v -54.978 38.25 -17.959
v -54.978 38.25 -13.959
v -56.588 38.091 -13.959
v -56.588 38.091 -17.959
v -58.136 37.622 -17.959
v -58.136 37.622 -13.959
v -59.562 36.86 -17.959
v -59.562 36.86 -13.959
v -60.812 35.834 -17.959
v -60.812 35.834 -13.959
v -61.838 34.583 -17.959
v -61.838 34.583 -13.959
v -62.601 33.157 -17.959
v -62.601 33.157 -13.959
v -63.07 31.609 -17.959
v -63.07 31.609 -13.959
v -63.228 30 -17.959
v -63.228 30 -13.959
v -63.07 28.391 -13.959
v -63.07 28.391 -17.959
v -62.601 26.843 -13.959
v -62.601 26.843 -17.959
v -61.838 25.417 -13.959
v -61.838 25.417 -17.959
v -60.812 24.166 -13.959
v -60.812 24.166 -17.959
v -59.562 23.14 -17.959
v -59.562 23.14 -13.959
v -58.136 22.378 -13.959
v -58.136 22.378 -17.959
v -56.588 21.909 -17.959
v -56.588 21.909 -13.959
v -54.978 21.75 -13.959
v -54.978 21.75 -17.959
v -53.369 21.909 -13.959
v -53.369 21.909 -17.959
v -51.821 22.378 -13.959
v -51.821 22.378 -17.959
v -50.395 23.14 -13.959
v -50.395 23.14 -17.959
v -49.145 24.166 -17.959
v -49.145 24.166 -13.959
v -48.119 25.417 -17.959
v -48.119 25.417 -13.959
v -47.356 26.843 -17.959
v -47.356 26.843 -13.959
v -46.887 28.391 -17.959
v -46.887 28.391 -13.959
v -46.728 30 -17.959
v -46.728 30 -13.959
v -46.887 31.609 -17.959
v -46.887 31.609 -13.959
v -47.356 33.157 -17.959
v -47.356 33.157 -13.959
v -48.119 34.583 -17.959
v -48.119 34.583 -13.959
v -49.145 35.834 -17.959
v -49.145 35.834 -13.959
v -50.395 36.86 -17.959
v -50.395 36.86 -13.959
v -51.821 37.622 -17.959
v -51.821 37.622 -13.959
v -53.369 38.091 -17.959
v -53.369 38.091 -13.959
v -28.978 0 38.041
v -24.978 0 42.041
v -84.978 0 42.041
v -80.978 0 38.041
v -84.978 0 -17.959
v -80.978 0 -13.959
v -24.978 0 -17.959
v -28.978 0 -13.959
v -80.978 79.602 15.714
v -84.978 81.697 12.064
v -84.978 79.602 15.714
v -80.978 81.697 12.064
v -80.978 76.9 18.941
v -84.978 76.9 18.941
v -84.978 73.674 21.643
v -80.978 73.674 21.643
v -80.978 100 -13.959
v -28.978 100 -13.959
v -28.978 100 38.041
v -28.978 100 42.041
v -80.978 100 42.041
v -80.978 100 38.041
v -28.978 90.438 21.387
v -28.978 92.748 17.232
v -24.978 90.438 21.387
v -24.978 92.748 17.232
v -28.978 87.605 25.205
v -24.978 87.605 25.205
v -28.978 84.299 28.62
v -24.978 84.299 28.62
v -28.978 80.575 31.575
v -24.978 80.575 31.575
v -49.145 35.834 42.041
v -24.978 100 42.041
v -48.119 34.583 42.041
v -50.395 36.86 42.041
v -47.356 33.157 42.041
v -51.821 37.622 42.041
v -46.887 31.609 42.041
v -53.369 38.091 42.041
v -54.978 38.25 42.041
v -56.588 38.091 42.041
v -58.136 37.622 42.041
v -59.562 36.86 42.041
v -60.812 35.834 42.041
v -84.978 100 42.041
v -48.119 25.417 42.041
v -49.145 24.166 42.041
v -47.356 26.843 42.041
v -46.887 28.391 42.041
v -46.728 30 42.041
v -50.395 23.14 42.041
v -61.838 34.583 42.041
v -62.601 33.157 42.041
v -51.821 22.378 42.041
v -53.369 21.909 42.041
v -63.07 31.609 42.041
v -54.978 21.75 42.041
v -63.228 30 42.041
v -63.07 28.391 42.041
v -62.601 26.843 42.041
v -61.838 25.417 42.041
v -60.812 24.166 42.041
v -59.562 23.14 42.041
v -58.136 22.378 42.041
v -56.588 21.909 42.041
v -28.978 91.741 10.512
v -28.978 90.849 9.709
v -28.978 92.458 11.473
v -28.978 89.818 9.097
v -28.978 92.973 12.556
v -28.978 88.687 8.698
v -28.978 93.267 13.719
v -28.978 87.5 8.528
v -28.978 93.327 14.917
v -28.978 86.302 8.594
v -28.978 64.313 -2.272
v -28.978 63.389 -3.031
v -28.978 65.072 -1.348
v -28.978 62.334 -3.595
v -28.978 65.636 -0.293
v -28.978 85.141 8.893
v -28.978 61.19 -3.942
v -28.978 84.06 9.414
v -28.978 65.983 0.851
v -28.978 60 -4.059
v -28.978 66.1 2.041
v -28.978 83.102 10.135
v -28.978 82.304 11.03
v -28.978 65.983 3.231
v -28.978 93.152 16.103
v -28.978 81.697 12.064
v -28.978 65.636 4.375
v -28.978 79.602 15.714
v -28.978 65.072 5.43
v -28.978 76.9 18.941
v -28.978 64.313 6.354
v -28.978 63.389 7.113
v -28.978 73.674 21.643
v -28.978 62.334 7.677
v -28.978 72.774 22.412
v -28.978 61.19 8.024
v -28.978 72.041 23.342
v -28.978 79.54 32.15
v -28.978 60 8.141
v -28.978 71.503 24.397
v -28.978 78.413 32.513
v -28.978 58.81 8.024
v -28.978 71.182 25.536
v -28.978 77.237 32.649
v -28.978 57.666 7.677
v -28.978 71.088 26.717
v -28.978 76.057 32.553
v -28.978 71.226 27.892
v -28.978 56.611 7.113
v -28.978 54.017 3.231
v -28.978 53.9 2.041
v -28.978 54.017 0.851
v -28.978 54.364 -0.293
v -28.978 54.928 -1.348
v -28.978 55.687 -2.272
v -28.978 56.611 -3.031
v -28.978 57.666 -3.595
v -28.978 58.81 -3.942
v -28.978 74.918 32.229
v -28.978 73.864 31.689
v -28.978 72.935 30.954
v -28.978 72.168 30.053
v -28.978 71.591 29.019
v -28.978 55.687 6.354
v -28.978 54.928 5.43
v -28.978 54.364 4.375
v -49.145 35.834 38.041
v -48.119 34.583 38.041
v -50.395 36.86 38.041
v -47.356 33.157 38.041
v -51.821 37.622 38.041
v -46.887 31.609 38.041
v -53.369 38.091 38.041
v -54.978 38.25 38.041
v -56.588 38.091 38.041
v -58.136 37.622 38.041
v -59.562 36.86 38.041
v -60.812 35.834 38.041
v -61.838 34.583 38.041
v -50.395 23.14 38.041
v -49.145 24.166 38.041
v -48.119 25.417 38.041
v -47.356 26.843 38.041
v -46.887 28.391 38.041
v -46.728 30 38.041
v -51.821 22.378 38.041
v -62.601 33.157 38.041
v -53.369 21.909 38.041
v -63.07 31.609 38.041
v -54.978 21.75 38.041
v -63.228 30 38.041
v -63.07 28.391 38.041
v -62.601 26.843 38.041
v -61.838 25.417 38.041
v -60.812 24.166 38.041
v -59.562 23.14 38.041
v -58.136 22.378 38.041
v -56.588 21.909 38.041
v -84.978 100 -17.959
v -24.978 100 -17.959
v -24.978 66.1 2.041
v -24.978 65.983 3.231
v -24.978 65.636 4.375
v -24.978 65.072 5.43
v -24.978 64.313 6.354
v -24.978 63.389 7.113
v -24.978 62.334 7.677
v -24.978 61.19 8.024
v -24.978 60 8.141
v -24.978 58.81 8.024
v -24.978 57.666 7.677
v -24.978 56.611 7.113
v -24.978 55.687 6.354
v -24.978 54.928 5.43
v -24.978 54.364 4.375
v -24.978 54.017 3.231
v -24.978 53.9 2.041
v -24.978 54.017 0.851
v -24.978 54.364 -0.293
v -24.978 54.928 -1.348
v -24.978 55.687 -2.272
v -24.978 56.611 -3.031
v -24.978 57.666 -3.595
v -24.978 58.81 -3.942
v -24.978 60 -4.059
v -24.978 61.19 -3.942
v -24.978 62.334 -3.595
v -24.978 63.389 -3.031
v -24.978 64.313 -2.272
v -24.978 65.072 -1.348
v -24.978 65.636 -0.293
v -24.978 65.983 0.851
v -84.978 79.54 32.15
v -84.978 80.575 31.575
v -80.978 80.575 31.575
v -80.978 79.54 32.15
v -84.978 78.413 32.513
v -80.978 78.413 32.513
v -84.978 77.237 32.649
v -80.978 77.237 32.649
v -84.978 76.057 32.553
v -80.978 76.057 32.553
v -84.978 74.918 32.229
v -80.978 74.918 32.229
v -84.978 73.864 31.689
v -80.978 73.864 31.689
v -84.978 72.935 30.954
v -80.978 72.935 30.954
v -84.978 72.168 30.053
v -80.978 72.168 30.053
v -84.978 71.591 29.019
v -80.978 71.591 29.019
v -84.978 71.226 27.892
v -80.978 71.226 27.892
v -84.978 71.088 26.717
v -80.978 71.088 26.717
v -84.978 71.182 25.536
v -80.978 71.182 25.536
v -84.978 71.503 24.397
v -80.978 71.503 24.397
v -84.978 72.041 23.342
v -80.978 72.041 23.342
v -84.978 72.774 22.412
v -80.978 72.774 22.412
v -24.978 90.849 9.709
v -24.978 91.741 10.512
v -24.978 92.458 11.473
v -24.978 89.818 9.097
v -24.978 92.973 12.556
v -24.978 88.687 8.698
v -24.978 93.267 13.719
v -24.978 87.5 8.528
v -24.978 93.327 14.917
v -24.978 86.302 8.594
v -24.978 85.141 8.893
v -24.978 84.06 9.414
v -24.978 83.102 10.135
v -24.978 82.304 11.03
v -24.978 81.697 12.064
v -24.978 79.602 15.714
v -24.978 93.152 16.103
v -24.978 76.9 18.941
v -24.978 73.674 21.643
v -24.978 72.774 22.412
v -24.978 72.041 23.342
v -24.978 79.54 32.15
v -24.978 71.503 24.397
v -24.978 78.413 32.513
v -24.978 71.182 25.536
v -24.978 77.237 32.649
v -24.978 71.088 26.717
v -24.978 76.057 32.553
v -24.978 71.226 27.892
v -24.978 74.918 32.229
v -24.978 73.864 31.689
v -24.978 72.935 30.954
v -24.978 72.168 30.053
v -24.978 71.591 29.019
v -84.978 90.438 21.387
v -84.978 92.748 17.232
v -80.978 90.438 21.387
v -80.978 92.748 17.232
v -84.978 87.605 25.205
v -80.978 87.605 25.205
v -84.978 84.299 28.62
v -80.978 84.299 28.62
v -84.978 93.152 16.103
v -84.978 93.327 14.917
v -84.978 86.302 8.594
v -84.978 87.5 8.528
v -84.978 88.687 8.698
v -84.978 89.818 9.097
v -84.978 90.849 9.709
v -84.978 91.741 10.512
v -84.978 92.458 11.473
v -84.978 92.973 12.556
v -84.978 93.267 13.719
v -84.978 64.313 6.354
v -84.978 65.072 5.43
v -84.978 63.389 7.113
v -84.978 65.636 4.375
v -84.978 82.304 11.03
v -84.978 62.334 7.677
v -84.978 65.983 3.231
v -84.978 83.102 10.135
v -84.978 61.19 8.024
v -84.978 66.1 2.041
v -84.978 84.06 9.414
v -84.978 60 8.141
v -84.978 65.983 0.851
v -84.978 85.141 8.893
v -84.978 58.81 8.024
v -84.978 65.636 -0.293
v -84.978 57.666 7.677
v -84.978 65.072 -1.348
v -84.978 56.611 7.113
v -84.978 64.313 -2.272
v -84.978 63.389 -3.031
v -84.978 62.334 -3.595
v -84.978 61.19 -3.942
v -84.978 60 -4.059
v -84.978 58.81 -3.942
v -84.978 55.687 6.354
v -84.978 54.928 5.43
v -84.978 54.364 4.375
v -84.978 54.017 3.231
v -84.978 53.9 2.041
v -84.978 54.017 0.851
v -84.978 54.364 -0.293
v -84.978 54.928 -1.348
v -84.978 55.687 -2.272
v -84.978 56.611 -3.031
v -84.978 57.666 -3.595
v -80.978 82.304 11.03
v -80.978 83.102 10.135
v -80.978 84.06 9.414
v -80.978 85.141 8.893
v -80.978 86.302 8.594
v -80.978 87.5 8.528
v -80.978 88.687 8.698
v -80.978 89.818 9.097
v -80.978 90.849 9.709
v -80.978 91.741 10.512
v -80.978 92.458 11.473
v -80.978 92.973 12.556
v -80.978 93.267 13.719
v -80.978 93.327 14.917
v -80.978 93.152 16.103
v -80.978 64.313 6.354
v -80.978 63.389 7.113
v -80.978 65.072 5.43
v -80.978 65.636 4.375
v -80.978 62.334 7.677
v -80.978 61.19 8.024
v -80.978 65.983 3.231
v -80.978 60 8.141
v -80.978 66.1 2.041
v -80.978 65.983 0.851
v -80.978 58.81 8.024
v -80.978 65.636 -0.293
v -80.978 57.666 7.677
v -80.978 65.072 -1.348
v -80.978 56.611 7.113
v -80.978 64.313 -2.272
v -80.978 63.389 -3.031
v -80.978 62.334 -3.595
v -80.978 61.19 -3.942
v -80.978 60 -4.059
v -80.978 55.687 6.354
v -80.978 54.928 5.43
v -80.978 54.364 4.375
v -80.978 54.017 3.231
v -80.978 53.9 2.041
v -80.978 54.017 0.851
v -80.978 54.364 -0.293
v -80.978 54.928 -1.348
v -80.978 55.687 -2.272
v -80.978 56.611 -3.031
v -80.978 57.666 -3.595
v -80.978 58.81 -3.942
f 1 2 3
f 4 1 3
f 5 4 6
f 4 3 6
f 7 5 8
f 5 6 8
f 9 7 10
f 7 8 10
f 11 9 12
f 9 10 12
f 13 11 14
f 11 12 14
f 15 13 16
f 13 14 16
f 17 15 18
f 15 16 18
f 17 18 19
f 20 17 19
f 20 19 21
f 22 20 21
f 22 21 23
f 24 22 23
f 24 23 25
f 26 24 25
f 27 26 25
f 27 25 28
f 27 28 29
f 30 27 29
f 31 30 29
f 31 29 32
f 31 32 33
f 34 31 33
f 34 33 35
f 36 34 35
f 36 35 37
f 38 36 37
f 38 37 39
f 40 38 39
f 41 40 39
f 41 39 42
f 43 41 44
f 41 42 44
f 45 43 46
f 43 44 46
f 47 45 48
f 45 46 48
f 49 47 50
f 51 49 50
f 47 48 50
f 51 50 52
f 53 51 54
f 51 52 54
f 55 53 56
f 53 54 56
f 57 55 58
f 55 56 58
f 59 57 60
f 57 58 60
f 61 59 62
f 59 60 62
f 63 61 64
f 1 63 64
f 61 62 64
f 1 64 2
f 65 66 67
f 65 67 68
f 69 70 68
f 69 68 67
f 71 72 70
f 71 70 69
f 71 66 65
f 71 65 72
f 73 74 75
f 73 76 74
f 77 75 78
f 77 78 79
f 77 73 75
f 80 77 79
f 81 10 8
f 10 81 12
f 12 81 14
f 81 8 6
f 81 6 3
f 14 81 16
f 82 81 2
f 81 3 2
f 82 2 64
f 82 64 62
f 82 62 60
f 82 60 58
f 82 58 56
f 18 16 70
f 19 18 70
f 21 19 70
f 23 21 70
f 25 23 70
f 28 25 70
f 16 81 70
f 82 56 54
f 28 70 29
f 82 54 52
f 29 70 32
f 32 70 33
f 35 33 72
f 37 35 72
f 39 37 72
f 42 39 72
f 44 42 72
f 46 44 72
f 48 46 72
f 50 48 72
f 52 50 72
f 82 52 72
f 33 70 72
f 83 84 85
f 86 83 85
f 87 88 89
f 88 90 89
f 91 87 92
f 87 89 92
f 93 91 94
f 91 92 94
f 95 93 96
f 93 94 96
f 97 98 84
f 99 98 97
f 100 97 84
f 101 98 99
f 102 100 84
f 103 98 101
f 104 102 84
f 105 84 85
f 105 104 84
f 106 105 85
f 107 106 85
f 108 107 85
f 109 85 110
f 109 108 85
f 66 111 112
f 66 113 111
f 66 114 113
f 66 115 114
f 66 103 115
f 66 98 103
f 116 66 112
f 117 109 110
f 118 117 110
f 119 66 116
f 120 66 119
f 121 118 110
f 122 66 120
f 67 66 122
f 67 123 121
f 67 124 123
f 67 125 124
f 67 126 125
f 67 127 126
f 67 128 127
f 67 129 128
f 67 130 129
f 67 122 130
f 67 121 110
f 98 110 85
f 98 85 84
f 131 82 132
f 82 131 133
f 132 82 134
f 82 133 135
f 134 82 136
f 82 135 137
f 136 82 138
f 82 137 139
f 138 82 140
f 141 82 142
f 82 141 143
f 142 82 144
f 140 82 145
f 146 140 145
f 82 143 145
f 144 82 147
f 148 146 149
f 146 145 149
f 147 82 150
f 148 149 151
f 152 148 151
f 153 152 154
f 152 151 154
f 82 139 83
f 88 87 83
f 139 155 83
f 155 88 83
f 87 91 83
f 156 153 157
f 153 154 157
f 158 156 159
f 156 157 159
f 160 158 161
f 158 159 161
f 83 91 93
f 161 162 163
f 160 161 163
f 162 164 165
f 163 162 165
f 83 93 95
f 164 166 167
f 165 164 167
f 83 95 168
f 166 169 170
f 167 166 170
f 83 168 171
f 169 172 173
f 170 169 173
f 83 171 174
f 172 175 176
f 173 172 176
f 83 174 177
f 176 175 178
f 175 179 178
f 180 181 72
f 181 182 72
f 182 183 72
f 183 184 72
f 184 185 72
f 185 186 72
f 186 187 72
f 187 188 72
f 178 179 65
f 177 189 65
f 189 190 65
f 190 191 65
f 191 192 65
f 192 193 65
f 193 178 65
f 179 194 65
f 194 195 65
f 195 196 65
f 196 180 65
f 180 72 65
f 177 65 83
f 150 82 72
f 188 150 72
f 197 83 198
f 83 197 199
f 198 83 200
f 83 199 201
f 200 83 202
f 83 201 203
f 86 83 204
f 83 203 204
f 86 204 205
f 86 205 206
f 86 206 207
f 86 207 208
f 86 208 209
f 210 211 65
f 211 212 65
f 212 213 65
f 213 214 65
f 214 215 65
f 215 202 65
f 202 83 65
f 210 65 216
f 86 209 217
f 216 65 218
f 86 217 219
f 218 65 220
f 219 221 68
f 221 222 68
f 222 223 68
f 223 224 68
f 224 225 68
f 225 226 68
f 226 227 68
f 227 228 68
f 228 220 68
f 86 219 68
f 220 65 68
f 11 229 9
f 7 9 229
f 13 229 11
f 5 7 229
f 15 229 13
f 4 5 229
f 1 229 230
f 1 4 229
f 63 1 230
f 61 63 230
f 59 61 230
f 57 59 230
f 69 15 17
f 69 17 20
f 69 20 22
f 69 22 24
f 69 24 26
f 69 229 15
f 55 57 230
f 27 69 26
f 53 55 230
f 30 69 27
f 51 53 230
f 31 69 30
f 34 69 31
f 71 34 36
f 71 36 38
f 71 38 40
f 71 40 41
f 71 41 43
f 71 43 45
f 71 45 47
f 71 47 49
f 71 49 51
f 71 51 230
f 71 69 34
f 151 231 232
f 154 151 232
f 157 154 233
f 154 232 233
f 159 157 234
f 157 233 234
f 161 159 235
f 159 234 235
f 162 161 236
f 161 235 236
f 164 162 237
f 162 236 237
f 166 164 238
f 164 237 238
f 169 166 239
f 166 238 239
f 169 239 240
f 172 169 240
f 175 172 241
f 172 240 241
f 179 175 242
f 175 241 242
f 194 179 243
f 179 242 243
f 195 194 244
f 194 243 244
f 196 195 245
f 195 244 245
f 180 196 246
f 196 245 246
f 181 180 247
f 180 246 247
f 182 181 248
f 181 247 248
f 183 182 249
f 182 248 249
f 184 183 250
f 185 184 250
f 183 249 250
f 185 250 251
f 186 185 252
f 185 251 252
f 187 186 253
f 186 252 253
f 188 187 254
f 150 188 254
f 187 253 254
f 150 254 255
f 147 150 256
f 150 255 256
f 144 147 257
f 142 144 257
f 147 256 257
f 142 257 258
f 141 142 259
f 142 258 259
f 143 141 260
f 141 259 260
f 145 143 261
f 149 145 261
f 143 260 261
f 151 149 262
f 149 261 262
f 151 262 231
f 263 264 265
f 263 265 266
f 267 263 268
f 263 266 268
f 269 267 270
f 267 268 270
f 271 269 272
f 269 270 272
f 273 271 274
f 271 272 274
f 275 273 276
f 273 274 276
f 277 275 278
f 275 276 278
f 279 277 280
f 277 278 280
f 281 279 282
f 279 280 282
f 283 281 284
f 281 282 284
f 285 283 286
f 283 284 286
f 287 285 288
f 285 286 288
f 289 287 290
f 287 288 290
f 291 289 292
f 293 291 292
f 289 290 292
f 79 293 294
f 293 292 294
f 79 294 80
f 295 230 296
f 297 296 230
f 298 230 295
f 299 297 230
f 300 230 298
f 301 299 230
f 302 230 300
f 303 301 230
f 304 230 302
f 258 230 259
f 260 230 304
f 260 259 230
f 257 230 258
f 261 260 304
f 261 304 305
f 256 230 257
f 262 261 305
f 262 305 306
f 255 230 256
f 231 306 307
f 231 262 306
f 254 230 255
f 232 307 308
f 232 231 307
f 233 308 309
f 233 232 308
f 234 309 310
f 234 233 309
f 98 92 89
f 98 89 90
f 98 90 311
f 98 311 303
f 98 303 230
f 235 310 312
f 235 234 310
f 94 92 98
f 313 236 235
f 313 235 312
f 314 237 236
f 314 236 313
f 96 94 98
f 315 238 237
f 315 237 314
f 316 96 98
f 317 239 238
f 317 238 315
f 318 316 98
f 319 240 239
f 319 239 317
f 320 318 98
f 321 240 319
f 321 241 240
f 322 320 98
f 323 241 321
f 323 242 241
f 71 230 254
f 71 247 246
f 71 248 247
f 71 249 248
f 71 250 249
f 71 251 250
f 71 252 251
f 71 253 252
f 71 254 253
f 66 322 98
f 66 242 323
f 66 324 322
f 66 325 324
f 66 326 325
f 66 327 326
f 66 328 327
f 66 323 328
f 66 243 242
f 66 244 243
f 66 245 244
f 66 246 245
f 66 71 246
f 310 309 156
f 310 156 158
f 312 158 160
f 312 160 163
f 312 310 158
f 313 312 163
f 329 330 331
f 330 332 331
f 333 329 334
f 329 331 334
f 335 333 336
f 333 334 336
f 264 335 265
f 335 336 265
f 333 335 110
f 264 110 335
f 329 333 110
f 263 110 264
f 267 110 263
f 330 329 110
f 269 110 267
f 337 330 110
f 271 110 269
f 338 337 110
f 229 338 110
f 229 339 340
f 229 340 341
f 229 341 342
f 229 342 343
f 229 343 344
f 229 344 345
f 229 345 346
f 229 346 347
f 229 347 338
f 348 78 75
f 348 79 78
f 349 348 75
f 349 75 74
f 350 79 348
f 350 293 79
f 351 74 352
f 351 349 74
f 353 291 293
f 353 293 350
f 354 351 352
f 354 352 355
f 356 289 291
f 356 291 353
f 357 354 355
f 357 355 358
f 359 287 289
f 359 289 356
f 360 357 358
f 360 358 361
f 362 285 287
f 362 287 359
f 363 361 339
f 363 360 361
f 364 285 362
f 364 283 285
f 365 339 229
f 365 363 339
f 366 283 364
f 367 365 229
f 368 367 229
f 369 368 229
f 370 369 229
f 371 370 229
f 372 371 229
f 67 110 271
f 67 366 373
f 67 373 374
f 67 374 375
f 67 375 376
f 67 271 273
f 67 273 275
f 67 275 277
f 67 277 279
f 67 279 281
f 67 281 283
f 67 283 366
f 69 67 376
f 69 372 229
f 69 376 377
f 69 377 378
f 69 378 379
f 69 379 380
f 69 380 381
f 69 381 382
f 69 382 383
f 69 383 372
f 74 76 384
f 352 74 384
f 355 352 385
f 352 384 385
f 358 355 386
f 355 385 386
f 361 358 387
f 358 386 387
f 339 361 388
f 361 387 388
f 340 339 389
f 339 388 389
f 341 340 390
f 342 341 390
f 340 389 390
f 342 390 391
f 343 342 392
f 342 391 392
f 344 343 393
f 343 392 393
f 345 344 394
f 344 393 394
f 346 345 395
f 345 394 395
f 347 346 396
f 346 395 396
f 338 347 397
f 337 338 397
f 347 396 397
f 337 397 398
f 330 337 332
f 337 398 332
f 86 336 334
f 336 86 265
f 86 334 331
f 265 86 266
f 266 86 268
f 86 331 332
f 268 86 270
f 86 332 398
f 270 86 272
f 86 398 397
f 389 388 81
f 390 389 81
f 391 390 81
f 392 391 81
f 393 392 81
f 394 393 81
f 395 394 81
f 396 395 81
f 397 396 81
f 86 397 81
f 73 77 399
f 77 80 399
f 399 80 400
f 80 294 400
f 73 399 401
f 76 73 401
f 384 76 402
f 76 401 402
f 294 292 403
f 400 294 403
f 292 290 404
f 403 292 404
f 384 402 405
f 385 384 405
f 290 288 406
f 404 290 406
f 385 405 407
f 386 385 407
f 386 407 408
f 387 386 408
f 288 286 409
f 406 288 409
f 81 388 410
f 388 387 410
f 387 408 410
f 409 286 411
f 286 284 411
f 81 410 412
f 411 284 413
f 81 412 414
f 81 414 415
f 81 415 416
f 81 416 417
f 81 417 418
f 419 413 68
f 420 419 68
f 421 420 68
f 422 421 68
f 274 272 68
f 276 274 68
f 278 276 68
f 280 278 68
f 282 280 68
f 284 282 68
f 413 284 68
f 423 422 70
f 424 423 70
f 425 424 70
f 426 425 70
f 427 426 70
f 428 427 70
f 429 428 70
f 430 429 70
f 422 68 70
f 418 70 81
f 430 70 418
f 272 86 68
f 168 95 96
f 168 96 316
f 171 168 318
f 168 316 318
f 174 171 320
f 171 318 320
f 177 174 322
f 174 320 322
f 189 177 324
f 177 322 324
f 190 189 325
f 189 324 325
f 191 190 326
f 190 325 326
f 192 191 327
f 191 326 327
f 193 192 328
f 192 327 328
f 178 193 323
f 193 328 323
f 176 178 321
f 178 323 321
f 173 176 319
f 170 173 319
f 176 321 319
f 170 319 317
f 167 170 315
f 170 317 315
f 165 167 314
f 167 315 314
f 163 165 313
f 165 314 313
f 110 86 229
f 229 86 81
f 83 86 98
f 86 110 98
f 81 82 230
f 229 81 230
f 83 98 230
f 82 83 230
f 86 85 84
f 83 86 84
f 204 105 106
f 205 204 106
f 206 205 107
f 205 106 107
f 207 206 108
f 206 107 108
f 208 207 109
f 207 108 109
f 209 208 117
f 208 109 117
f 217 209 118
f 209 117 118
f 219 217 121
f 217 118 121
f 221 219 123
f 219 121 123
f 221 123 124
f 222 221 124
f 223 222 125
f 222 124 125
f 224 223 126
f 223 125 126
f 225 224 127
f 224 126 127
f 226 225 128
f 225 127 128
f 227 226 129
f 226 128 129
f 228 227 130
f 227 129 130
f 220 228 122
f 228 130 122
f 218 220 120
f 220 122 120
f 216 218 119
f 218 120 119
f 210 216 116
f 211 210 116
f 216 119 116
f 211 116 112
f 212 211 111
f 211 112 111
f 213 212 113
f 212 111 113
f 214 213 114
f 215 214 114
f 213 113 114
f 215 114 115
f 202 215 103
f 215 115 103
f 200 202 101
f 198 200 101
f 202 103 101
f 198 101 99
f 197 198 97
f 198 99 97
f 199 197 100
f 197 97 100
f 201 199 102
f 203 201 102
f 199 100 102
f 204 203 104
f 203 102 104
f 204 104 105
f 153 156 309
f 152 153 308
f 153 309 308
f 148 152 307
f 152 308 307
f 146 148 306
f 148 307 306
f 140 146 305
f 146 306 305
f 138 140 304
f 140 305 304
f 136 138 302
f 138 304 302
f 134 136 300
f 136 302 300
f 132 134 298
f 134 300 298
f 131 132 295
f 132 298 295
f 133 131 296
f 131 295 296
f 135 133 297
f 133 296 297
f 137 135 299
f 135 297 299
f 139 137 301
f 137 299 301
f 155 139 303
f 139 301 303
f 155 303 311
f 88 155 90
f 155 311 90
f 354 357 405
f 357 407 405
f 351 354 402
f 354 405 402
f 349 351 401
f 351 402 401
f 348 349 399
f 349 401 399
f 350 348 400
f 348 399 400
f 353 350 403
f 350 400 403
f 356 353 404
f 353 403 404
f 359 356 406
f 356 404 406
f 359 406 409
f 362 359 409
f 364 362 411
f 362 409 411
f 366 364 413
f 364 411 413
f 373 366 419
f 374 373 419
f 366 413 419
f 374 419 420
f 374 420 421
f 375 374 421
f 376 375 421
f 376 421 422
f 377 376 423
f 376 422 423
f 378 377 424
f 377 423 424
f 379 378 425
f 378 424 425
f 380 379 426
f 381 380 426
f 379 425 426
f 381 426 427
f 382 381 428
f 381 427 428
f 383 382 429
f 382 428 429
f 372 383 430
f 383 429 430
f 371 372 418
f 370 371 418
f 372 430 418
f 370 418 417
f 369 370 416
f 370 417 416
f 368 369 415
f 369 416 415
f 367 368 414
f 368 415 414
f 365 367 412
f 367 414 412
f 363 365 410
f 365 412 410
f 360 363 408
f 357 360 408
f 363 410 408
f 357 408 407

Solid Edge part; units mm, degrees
sketch "Sketch1" plane through (0, 0, 0) normal (0, -1, 0) x (1, 0, 0)
  line L0 (-80.9785, -13.9589) -> (-28.9785, -13.9589)
  line L1 (-28.9785, -13.9589) -> (-28.9785, 38.0411)
  line L2 (-28.9785, 38.0411) -> (-80.9785, 38.0411)
  line L3 (-80.9785, 38.0411) -> (-80.9785, -13.9589)
  line L4 (-84.9785, -17.9589) -> (-24.9785, -17.9589)
  line L5 (-24.9785, -17.9589) -> (-24.9785, 42.0411)
  line L6 (-24.9785, 42.0411) -> (-84.9785, 42.0411)
  line L7 (-84.9785, 42.0411) -> (-84.9785, -17.9589)
  dimension "D1" = 60
  dimension "D2" = 4
  dimension "D3" = 4
  dimension "D4" = 60
extrude "Protrusion1" add sketch "Sketch1" against normal blind 100
sketch "Sketch2" plane through (-49.9785, 50, 42.0411) normal (0, 0, 1) x (1, 0, 0)
  line L0 (21, 49.9999) -> (-31, 49.9999)
  line L1 (-31, 49.9999) -> (-31, 50) construction
  line L2 (-31, 50) -> (21, 50)
  line L3 (21, 50) -> (21, 49.9999) construction
  dimension "D1" = 0.0001
  dimension "D2" = 52
extrude "Cutout1" cut sketch "Sketch2" against normal blind 5
sketch "Sketch3" plane through (-24.9785, 50, 17.0411) normal (1, 0, 0) x (0, 1, 0)
  arc A0 (23.6741, 4.6017) -> (31.6966, -4.9767) centre (10, -15) cw
  arc A1 (42.748, 0.1912) -> (31.6966, -4.9767) centre (37.2343, -2.4184) cw
  arc A2 (30.5748, 14.5338) -> (42.748, 0.1912) centre (9.8876, -15.3615) cw
  arc A3 (30.5748, 14.5338) -> (23.6741, 4.6017) centre (27.1339, 9.5613) ccw
  circle A4 centre (10, -15) radius 6.1
  dimension "D1" = 12.2
  dimension "D2" = 20
  dimension "D3" = 40
  dimension "D4" = 12.2
  dimension "D5" = 23.9
extrude "Cutout2" cut sketch "Sketch3" against normal through all
sketch "Sketch4" plane through (-49.9785, 75, 42.0411) normal (0, 0, 1) x (0, 1, 0)
  circle A0 centre (-45, 5) radius 8.25
  dimension "D1" = 16.5
  dimension "D2" = 30
  dimension "D3" = 30
  dimension "D4" = 60
extrude "Cutout3" cut sketch "Sketch4" against normal through all
